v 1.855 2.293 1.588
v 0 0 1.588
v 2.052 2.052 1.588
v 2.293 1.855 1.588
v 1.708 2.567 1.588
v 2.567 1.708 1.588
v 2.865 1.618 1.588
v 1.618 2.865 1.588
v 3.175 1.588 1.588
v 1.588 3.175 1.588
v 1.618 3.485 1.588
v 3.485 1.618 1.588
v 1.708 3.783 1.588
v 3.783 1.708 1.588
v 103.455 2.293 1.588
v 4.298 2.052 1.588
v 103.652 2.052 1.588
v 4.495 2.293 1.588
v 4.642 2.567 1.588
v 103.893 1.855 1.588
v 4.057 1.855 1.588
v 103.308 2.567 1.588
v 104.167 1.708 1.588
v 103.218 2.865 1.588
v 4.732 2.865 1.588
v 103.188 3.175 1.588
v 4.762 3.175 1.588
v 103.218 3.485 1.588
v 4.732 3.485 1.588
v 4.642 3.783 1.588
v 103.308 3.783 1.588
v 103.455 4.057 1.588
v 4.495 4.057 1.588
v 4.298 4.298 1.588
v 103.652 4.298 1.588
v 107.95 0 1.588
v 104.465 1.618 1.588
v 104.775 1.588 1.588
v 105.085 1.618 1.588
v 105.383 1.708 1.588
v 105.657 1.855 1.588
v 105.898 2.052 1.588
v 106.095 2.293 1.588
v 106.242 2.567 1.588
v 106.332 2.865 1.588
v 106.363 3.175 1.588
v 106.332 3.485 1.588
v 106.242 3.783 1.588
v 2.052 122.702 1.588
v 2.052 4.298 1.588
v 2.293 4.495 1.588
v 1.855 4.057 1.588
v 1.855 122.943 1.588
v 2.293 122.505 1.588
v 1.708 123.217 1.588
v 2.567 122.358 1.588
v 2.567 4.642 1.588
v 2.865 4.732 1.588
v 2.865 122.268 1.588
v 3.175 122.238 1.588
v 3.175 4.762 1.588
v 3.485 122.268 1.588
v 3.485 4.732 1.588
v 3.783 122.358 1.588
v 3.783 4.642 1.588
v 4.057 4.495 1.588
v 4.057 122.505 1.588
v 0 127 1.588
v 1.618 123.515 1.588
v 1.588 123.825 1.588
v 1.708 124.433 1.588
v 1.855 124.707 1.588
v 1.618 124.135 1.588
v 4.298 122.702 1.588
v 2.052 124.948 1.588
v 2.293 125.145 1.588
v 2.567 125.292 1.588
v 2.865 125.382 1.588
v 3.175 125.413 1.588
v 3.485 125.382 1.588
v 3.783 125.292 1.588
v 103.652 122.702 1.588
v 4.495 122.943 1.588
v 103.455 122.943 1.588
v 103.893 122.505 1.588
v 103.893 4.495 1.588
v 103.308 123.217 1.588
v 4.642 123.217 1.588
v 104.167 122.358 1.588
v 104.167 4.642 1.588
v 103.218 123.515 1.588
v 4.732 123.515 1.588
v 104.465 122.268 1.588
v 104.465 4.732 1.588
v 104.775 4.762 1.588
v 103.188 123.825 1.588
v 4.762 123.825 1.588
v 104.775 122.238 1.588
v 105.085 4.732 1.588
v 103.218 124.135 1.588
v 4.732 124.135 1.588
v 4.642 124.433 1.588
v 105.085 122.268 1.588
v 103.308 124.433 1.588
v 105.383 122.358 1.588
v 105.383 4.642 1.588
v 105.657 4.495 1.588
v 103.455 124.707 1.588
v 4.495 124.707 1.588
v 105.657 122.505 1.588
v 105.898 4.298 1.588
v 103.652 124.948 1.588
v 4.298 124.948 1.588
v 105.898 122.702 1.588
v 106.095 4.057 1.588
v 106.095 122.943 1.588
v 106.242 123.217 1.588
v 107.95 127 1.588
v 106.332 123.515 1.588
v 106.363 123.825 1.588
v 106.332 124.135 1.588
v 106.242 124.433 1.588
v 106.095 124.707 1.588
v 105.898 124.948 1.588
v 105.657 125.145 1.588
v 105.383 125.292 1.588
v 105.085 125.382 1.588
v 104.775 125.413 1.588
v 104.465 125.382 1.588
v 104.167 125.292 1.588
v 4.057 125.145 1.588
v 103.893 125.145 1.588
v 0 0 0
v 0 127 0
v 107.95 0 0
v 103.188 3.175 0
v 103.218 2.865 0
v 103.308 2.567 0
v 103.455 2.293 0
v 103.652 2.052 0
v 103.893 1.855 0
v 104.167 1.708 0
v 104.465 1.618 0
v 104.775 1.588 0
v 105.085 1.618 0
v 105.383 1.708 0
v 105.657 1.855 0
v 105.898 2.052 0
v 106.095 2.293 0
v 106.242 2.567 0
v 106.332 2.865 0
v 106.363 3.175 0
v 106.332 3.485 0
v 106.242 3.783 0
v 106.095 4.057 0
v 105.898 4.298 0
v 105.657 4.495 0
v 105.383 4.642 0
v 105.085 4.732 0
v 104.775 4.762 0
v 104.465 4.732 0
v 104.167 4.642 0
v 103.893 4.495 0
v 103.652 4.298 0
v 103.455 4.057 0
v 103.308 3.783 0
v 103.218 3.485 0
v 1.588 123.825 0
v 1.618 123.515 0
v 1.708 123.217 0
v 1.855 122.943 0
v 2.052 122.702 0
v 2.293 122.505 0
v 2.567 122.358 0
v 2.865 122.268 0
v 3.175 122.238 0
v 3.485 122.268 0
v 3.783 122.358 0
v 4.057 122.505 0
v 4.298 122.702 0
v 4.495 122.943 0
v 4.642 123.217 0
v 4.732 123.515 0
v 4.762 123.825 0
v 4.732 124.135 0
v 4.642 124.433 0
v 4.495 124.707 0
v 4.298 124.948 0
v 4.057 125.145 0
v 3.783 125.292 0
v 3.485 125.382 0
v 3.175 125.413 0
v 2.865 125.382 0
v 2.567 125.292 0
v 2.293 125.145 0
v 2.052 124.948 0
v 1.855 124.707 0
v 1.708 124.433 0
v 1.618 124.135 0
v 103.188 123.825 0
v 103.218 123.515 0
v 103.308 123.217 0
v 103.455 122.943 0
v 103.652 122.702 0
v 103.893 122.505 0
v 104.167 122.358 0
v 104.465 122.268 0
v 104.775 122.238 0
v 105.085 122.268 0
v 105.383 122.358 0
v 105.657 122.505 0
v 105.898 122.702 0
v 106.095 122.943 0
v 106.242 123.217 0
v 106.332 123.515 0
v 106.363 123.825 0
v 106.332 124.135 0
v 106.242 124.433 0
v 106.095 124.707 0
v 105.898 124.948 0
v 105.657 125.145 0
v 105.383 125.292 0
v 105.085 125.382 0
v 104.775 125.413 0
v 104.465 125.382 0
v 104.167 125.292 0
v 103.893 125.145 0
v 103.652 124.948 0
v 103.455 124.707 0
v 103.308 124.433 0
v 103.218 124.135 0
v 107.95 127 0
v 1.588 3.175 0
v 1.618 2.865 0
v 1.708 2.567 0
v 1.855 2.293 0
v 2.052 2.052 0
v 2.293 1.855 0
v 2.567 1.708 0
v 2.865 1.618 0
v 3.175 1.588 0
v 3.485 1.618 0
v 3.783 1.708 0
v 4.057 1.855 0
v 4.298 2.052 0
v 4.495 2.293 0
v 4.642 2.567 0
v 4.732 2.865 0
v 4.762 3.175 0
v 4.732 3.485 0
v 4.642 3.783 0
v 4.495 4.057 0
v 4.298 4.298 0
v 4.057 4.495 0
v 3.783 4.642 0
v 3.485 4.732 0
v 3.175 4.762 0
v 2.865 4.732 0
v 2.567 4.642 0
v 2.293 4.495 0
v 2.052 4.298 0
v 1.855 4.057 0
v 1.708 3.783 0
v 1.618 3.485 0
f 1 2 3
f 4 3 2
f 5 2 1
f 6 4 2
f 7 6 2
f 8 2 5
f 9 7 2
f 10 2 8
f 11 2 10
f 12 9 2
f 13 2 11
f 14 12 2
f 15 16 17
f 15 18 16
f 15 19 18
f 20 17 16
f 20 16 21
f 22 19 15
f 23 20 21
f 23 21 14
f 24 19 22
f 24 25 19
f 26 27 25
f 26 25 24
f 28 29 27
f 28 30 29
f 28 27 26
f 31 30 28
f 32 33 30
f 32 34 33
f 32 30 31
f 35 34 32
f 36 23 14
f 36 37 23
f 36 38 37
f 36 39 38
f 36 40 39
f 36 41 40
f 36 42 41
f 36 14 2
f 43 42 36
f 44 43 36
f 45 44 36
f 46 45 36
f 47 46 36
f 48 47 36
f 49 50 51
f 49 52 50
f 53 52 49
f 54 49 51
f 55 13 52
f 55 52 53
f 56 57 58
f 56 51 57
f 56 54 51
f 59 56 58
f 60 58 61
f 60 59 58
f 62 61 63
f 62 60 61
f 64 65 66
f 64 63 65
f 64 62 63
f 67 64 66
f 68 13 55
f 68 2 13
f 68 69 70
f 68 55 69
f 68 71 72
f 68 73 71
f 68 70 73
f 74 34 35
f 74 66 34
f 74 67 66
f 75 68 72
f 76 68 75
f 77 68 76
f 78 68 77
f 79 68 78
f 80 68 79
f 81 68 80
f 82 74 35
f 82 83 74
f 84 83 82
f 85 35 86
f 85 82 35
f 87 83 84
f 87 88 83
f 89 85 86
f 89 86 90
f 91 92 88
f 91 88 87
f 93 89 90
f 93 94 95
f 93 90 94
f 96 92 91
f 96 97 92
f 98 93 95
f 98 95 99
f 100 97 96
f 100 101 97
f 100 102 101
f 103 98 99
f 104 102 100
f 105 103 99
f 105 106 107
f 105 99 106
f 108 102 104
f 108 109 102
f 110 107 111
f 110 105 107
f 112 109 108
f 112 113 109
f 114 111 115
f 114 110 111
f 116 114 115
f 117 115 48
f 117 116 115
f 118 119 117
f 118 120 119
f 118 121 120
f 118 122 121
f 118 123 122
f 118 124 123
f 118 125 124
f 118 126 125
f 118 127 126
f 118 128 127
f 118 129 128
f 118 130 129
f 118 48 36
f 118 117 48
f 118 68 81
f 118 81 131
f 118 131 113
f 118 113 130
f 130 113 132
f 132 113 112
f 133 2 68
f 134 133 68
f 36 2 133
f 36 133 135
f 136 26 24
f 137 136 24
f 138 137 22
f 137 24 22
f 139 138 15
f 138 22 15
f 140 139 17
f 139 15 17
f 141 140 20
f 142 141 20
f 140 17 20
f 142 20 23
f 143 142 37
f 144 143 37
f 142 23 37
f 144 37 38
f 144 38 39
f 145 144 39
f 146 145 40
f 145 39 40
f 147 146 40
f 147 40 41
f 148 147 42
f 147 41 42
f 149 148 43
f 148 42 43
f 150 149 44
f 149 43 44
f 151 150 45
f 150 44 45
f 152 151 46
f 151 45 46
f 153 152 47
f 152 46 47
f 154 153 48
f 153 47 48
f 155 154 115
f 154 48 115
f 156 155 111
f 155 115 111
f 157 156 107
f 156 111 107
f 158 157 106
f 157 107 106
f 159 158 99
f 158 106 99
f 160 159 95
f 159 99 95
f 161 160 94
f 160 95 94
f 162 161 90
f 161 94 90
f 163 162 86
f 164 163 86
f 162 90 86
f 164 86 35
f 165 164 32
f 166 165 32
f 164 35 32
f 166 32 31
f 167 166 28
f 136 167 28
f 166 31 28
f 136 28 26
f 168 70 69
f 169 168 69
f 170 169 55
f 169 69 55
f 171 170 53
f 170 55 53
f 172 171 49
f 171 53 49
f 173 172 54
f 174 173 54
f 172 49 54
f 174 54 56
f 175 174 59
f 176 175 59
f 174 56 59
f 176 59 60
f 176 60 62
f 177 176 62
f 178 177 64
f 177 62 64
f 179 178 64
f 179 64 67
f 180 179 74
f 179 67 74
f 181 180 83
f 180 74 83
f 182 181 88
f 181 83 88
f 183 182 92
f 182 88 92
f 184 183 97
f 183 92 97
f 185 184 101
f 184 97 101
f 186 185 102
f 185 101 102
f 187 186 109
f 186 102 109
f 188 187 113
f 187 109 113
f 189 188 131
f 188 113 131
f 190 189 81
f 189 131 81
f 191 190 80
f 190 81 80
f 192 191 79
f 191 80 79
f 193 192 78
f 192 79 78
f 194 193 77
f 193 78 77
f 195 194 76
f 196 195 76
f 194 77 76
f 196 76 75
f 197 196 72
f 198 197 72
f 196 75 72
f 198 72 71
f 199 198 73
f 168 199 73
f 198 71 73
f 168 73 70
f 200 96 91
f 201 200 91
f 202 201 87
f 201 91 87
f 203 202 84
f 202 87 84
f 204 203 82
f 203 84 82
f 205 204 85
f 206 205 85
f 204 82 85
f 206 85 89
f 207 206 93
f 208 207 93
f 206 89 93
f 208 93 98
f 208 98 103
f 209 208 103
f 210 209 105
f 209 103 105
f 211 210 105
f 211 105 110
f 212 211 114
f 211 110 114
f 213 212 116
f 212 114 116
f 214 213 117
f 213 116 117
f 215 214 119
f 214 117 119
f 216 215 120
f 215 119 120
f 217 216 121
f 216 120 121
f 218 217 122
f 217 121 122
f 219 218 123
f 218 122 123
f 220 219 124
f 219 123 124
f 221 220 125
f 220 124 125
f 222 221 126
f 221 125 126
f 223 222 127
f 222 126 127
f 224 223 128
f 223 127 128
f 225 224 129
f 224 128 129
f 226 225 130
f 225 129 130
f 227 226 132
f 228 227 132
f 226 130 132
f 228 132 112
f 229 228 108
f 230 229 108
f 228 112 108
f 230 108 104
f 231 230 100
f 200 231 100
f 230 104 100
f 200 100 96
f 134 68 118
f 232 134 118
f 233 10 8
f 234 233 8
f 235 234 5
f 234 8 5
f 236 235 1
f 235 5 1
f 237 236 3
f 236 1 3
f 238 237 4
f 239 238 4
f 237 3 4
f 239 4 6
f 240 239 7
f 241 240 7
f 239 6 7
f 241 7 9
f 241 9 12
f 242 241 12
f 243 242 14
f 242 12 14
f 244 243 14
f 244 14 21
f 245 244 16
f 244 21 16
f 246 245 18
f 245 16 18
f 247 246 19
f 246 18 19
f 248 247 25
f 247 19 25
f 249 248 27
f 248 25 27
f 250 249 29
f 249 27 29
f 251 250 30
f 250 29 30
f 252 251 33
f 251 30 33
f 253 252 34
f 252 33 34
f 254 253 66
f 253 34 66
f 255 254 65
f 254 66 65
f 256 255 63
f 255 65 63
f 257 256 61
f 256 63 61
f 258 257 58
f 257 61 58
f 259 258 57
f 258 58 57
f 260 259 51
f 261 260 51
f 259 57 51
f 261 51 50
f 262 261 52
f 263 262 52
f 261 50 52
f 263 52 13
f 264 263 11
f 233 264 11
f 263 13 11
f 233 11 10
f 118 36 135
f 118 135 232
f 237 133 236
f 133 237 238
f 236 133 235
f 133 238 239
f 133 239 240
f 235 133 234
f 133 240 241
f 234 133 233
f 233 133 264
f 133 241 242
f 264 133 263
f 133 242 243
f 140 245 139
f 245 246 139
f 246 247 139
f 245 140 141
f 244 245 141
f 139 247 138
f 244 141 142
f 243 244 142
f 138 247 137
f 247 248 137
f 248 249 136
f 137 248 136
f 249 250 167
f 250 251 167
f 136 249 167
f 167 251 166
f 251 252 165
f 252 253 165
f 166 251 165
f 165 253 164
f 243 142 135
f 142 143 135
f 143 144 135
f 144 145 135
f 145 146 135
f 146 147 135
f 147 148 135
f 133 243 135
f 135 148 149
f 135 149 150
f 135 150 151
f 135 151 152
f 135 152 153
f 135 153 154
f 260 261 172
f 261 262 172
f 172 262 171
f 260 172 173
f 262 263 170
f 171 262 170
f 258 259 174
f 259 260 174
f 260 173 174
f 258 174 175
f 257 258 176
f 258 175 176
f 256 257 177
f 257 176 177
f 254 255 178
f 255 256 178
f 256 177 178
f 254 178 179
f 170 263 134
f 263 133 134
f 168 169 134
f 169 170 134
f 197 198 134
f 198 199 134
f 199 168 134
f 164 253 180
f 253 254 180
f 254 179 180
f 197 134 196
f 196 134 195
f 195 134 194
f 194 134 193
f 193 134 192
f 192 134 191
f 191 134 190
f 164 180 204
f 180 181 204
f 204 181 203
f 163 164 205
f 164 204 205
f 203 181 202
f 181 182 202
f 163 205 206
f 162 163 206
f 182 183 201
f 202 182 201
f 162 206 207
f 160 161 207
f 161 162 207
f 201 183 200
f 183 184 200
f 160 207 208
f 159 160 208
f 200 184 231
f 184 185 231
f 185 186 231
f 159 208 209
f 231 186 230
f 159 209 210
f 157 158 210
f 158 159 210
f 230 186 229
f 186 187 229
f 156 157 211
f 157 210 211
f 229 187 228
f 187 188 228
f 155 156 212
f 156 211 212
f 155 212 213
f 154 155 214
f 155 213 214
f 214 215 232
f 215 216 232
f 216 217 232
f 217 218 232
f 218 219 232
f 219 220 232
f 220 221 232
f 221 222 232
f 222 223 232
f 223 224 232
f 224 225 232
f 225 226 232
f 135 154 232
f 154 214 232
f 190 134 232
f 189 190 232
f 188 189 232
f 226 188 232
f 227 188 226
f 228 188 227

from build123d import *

# Parameters (mm, degrees)
SKETCH1_W           = 107.95
SKETCH1_H           = 127
SKETCH1_R           = 1.5875
BOSS_EXTRUDE1_DEPTH = 1.5875


with BuildPart() as part:
    # Sketch1 → Boss-Extrude1 (new body)
    with BuildSketch(Plane.XY.offset(1.5875)):
        with Locations((53.975, 63.5)):
            Rectangle(SKETCH1_W, SKETCH1_H)
        with Locations(Location((104.775, 3.175, 0), (0, 0, 180))):
            Circle(SKETCH1_R, mode=Mode.SUBTRACT)
        with Locations(Location((3.175, 123.825, 0), (0, 0, 180))):
            Circle(SKETCH1_R, mode=Mode.SUBTRACT)
        with Locations(Location((104.775, 123.825, 0), (0, 0, 180))):
            Circle(SKETCH1_R, mode=Mode.SUBTRACT)
        with Locations(Location((3.175, 3.175, 0), (0, 0, 180))):
            Circle(SKETCH1_R, mode=Mode.SUBTRACT)
    extrude(amount=-BOSS_EXTRUDE1_DEPTH)


solid = part.part
